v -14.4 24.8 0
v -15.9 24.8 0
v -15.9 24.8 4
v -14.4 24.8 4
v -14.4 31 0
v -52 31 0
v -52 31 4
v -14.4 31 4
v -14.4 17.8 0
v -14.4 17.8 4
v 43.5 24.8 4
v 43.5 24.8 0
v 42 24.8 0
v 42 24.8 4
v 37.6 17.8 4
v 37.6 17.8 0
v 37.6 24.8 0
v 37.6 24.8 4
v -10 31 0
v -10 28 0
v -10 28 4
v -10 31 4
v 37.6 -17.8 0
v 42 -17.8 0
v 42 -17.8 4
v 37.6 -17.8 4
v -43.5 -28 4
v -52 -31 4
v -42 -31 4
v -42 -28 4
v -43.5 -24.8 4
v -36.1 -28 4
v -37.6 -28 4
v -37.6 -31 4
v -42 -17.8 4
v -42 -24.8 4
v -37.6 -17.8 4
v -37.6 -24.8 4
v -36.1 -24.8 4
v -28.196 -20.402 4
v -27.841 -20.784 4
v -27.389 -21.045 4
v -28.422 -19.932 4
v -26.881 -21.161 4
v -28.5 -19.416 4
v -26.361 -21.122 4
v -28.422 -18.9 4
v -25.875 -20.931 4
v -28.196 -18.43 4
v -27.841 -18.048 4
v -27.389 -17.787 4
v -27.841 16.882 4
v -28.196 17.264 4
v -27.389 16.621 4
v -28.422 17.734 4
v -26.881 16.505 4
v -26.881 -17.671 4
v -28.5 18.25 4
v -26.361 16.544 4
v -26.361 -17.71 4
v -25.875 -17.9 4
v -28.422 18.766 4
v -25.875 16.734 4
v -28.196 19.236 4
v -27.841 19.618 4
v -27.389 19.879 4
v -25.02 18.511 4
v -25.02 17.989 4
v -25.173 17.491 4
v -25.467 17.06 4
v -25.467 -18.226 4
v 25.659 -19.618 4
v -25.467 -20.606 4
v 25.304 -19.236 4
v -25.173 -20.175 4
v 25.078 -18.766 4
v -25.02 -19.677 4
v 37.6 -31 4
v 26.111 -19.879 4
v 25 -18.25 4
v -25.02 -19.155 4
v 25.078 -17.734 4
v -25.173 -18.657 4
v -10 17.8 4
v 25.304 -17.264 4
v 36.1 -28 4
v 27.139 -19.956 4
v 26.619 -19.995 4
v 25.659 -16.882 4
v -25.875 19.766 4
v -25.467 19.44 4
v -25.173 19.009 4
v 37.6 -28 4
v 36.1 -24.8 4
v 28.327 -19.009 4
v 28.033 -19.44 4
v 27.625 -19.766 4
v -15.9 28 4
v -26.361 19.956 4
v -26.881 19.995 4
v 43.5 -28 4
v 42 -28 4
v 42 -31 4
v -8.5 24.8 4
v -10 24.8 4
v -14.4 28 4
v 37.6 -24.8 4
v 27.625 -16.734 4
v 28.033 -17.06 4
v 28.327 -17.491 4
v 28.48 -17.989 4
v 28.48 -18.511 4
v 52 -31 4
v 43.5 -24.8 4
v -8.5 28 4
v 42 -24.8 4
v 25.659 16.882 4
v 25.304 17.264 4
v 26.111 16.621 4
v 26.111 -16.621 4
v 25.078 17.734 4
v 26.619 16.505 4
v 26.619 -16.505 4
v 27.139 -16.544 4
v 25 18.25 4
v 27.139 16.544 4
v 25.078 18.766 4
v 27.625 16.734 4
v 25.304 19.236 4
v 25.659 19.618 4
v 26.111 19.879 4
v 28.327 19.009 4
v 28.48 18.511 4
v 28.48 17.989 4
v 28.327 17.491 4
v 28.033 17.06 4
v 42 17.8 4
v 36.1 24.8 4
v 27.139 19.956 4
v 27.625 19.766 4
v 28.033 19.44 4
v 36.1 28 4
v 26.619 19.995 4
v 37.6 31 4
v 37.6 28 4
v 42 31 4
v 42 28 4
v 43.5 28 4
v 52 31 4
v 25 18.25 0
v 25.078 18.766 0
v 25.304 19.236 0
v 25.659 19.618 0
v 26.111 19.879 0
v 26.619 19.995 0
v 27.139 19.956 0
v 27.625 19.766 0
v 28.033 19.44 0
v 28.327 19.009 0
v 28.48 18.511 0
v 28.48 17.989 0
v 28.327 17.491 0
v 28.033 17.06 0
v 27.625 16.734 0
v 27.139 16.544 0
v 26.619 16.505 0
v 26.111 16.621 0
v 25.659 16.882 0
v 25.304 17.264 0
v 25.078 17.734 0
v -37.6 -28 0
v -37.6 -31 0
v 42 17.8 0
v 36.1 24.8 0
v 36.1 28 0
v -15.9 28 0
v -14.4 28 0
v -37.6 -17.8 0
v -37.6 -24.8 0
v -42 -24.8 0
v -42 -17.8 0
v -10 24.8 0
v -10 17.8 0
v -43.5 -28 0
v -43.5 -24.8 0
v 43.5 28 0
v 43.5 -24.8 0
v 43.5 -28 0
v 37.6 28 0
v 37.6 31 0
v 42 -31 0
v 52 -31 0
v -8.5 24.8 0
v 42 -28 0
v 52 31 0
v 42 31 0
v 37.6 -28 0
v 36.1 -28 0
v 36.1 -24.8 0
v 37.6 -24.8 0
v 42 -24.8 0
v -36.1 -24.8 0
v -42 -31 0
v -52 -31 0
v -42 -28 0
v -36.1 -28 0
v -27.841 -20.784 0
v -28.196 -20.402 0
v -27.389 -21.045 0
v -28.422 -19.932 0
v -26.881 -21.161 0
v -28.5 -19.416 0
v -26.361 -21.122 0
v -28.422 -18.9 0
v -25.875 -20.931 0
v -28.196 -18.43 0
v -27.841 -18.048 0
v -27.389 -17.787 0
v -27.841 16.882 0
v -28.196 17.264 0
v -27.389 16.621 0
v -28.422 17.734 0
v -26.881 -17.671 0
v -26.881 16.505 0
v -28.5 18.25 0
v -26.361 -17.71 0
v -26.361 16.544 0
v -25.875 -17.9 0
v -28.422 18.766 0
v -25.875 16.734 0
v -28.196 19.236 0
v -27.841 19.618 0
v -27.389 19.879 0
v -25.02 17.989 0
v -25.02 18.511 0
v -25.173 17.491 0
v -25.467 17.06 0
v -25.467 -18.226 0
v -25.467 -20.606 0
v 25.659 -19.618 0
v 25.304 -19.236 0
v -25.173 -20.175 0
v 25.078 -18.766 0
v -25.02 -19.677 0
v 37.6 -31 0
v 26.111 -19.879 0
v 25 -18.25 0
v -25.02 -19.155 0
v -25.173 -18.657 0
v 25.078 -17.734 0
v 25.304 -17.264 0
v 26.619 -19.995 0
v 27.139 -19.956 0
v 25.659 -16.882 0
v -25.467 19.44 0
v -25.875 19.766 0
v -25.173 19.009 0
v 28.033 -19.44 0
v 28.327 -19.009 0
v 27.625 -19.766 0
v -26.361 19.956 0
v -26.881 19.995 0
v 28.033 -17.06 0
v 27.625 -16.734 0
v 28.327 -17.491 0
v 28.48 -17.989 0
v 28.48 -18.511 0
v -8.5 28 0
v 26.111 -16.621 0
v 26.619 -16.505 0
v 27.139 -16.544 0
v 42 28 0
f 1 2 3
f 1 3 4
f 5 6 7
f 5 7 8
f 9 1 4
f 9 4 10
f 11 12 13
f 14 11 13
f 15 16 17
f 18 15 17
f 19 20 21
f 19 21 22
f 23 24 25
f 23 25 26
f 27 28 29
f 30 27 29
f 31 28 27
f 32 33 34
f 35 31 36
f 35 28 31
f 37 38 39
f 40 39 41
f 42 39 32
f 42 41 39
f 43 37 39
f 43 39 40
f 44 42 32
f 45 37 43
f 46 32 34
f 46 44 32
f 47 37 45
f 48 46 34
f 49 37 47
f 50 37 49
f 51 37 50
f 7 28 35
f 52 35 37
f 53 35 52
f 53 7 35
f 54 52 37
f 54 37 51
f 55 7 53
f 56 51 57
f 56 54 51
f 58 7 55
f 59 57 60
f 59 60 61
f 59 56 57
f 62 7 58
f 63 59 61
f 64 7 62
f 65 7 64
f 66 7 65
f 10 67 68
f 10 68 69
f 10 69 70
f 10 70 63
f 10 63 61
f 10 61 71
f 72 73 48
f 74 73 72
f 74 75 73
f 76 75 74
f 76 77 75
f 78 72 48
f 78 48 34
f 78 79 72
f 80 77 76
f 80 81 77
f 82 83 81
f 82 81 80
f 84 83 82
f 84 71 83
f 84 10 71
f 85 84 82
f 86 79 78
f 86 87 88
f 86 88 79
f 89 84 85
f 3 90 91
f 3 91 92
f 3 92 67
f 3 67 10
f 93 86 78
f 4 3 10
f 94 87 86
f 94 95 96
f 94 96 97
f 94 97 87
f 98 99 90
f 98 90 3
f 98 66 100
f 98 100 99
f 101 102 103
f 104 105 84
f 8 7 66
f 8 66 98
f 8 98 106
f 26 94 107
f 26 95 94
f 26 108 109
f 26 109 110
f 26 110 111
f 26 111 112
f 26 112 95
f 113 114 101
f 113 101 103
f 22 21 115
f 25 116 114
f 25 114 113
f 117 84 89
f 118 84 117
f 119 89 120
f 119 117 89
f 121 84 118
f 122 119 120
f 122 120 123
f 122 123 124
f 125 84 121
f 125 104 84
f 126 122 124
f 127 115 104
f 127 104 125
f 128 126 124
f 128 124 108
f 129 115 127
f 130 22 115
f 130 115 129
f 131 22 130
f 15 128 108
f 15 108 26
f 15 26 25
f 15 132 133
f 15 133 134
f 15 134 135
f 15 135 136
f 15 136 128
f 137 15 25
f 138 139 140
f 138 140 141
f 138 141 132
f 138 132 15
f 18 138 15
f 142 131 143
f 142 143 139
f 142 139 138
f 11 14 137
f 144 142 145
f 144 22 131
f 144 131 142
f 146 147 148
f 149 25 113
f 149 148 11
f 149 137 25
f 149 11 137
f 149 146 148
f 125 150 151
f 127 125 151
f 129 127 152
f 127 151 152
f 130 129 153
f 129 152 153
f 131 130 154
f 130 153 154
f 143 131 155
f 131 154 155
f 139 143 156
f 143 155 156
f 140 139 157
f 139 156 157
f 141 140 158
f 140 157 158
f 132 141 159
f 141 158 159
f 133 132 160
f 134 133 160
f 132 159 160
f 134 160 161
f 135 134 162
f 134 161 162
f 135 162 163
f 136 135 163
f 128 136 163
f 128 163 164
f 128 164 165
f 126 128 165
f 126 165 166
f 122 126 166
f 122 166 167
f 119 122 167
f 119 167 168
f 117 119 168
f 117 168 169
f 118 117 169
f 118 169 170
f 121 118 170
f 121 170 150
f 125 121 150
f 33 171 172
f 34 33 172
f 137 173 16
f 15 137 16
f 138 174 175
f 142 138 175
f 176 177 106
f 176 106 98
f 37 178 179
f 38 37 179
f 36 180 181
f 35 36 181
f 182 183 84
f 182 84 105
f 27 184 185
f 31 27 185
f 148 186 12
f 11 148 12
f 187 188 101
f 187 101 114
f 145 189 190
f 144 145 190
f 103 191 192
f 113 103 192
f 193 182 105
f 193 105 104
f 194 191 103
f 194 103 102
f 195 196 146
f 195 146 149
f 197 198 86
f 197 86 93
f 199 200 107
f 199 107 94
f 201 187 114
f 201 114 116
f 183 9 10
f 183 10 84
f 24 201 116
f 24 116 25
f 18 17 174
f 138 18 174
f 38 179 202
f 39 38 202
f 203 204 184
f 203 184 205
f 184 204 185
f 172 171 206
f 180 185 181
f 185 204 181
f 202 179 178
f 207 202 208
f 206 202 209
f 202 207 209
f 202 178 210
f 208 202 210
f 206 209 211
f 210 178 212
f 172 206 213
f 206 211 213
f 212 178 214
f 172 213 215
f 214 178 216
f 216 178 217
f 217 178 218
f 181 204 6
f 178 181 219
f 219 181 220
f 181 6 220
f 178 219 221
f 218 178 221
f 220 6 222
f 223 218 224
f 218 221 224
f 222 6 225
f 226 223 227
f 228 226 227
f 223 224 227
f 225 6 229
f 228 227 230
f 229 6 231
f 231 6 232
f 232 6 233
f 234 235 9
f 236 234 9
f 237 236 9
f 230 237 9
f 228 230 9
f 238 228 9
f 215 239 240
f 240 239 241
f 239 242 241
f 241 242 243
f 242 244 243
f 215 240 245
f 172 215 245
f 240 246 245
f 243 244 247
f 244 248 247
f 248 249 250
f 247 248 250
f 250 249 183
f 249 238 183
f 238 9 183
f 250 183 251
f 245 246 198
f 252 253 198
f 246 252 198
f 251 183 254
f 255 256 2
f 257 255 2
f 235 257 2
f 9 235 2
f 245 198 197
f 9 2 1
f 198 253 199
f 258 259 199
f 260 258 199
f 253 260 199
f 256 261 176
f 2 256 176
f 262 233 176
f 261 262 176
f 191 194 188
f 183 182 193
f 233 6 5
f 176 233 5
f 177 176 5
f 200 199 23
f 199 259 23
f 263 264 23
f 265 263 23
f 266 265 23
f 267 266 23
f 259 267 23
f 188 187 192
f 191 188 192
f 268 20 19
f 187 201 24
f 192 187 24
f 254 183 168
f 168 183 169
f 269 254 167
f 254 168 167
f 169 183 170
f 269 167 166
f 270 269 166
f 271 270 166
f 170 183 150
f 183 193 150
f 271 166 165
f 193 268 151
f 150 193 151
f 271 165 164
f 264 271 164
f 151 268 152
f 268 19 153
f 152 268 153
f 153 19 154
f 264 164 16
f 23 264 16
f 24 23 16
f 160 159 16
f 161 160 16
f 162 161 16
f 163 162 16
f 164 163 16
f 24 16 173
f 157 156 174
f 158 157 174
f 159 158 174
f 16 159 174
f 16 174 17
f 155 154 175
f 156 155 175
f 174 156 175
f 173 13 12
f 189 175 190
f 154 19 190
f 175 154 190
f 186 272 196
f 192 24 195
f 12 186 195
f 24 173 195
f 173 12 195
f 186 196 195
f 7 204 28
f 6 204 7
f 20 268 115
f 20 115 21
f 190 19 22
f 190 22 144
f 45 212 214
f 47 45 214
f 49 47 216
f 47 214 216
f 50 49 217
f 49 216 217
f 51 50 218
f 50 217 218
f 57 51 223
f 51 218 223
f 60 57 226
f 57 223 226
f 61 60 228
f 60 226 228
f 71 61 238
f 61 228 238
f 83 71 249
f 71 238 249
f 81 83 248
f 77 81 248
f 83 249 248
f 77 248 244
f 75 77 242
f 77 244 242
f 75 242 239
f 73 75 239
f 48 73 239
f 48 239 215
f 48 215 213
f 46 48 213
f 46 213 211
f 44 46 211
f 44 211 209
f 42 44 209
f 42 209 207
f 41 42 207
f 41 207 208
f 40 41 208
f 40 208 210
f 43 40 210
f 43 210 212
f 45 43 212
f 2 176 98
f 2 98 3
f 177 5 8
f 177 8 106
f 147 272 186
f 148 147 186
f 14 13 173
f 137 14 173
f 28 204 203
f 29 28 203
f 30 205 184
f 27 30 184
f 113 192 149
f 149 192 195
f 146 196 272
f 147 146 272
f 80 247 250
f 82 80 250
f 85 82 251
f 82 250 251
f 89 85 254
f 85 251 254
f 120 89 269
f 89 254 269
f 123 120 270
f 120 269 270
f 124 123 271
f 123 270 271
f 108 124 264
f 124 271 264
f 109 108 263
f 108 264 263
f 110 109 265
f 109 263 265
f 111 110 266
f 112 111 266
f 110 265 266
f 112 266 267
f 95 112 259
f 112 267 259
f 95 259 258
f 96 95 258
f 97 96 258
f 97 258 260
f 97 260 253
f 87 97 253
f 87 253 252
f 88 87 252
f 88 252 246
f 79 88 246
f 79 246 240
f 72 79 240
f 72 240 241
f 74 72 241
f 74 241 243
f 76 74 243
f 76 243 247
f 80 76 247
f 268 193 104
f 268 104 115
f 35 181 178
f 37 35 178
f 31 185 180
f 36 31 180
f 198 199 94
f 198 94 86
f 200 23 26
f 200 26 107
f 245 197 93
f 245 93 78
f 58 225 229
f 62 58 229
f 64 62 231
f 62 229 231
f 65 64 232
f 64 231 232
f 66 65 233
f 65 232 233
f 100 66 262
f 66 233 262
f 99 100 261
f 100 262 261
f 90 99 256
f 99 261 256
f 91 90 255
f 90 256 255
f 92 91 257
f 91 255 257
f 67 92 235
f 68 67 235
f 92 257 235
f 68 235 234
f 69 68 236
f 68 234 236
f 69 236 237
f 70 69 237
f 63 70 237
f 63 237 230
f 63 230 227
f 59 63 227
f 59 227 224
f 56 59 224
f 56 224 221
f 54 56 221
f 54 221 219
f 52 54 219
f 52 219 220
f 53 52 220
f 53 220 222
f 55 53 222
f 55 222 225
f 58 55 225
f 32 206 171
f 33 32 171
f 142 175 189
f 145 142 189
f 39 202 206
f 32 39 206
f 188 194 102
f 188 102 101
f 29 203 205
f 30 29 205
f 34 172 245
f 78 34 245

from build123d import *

# Parameters (mm, degrees)
SKETCH1_W           = 104
SKETCH1_H           = 62
BOSS_EXTRUDE1_DEPTH = 4
CUT_EXTRUDE1_DEPTH  = 10
SKETCH4_R           = 1.75
CUT_EXTRUDE3_DEPTH  = 10


with BuildPart() as part:
    # Sketch1 → Boss-Extrude1 (new body)
    with BuildSketch(Plane.XY):
        Rectangle(SKETCH1_W, SKETCH1_H)
    extrude(amount=BOSS_EXTRUDE1_DEPTH)

    # Sketch2 → Cut-Extrude1 (cut)
    with BuildSketch(Plane(origin=(0, 0, 0), x_dir=(-1, 0, 0), z_dir=(0, 0, -1))):
        Polygon((-37.6, -28), (-37.6, -31), (-42, -31), (-42, -28), (-43.5, -28), (-43.5, -24.8), (-42, -24.8), (-42, -17.8), (-37.6, -17.8), (-37.6, -24.8), (-36.1, -24.8), (-36.1, -28), align=None)
        Polygon((42, -31), (42, -28), (43.5, -28), (43.5, -24.8), (42, -24.8), (42, -17.8), (37.6, -17.8), (37.6, -24.8), (36.1, -24.8), (36.1, -28), (37.6, -28), (37.6, -31), align=None)
        Polygon((-42, 31), (-42, 28), (-43.5, 28), (-43.5, 24.8), (-42, 24.8), (-42, 17.8), (-37.6, 17.8), (-37.6, 24.8), (-36.1, 24.8), (-36.1, 28), (-37.6, 28), (-37.6, 31), align=None)
        Polygon((14.4, 24.8), (14.4, 17.8), (10, 17.8), (10, 24.8), (8.5, 24.8), (8.5, 28), (10, 28), (10, 31), (14.4, 31), (14.4, 28), (15.9, 28), (15.9, 24.8), align=None)
    extrude(amount=-CUT_EXTRUDE1_DEPTH, mode=Mode.SUBTRACT)

    # Sketch4 → Cut-Extrude3 (cut)
    with BuildSketch(Plane(origin=(0, 0, 0), x_dir=(-1, 0, 0), z_dir=(0, 0, -1))):
        with Locations((-26.75, 18.25)):
            Circle(SKETCH4_R)
        with Locations((-26.75, -18.25)):
            Circle(SKETCH4_R)
        with Locations((26.75, 18.25)):
            Circle(SKETCH4_R)
        with Locations((26.75, -19.415816569)):
            Circle(SKETCH4_R)
    extrude(amount=-CUT_EXTRUDE3_DEPTH, mode=Mode.SUBTRACT)


solid = part.part
